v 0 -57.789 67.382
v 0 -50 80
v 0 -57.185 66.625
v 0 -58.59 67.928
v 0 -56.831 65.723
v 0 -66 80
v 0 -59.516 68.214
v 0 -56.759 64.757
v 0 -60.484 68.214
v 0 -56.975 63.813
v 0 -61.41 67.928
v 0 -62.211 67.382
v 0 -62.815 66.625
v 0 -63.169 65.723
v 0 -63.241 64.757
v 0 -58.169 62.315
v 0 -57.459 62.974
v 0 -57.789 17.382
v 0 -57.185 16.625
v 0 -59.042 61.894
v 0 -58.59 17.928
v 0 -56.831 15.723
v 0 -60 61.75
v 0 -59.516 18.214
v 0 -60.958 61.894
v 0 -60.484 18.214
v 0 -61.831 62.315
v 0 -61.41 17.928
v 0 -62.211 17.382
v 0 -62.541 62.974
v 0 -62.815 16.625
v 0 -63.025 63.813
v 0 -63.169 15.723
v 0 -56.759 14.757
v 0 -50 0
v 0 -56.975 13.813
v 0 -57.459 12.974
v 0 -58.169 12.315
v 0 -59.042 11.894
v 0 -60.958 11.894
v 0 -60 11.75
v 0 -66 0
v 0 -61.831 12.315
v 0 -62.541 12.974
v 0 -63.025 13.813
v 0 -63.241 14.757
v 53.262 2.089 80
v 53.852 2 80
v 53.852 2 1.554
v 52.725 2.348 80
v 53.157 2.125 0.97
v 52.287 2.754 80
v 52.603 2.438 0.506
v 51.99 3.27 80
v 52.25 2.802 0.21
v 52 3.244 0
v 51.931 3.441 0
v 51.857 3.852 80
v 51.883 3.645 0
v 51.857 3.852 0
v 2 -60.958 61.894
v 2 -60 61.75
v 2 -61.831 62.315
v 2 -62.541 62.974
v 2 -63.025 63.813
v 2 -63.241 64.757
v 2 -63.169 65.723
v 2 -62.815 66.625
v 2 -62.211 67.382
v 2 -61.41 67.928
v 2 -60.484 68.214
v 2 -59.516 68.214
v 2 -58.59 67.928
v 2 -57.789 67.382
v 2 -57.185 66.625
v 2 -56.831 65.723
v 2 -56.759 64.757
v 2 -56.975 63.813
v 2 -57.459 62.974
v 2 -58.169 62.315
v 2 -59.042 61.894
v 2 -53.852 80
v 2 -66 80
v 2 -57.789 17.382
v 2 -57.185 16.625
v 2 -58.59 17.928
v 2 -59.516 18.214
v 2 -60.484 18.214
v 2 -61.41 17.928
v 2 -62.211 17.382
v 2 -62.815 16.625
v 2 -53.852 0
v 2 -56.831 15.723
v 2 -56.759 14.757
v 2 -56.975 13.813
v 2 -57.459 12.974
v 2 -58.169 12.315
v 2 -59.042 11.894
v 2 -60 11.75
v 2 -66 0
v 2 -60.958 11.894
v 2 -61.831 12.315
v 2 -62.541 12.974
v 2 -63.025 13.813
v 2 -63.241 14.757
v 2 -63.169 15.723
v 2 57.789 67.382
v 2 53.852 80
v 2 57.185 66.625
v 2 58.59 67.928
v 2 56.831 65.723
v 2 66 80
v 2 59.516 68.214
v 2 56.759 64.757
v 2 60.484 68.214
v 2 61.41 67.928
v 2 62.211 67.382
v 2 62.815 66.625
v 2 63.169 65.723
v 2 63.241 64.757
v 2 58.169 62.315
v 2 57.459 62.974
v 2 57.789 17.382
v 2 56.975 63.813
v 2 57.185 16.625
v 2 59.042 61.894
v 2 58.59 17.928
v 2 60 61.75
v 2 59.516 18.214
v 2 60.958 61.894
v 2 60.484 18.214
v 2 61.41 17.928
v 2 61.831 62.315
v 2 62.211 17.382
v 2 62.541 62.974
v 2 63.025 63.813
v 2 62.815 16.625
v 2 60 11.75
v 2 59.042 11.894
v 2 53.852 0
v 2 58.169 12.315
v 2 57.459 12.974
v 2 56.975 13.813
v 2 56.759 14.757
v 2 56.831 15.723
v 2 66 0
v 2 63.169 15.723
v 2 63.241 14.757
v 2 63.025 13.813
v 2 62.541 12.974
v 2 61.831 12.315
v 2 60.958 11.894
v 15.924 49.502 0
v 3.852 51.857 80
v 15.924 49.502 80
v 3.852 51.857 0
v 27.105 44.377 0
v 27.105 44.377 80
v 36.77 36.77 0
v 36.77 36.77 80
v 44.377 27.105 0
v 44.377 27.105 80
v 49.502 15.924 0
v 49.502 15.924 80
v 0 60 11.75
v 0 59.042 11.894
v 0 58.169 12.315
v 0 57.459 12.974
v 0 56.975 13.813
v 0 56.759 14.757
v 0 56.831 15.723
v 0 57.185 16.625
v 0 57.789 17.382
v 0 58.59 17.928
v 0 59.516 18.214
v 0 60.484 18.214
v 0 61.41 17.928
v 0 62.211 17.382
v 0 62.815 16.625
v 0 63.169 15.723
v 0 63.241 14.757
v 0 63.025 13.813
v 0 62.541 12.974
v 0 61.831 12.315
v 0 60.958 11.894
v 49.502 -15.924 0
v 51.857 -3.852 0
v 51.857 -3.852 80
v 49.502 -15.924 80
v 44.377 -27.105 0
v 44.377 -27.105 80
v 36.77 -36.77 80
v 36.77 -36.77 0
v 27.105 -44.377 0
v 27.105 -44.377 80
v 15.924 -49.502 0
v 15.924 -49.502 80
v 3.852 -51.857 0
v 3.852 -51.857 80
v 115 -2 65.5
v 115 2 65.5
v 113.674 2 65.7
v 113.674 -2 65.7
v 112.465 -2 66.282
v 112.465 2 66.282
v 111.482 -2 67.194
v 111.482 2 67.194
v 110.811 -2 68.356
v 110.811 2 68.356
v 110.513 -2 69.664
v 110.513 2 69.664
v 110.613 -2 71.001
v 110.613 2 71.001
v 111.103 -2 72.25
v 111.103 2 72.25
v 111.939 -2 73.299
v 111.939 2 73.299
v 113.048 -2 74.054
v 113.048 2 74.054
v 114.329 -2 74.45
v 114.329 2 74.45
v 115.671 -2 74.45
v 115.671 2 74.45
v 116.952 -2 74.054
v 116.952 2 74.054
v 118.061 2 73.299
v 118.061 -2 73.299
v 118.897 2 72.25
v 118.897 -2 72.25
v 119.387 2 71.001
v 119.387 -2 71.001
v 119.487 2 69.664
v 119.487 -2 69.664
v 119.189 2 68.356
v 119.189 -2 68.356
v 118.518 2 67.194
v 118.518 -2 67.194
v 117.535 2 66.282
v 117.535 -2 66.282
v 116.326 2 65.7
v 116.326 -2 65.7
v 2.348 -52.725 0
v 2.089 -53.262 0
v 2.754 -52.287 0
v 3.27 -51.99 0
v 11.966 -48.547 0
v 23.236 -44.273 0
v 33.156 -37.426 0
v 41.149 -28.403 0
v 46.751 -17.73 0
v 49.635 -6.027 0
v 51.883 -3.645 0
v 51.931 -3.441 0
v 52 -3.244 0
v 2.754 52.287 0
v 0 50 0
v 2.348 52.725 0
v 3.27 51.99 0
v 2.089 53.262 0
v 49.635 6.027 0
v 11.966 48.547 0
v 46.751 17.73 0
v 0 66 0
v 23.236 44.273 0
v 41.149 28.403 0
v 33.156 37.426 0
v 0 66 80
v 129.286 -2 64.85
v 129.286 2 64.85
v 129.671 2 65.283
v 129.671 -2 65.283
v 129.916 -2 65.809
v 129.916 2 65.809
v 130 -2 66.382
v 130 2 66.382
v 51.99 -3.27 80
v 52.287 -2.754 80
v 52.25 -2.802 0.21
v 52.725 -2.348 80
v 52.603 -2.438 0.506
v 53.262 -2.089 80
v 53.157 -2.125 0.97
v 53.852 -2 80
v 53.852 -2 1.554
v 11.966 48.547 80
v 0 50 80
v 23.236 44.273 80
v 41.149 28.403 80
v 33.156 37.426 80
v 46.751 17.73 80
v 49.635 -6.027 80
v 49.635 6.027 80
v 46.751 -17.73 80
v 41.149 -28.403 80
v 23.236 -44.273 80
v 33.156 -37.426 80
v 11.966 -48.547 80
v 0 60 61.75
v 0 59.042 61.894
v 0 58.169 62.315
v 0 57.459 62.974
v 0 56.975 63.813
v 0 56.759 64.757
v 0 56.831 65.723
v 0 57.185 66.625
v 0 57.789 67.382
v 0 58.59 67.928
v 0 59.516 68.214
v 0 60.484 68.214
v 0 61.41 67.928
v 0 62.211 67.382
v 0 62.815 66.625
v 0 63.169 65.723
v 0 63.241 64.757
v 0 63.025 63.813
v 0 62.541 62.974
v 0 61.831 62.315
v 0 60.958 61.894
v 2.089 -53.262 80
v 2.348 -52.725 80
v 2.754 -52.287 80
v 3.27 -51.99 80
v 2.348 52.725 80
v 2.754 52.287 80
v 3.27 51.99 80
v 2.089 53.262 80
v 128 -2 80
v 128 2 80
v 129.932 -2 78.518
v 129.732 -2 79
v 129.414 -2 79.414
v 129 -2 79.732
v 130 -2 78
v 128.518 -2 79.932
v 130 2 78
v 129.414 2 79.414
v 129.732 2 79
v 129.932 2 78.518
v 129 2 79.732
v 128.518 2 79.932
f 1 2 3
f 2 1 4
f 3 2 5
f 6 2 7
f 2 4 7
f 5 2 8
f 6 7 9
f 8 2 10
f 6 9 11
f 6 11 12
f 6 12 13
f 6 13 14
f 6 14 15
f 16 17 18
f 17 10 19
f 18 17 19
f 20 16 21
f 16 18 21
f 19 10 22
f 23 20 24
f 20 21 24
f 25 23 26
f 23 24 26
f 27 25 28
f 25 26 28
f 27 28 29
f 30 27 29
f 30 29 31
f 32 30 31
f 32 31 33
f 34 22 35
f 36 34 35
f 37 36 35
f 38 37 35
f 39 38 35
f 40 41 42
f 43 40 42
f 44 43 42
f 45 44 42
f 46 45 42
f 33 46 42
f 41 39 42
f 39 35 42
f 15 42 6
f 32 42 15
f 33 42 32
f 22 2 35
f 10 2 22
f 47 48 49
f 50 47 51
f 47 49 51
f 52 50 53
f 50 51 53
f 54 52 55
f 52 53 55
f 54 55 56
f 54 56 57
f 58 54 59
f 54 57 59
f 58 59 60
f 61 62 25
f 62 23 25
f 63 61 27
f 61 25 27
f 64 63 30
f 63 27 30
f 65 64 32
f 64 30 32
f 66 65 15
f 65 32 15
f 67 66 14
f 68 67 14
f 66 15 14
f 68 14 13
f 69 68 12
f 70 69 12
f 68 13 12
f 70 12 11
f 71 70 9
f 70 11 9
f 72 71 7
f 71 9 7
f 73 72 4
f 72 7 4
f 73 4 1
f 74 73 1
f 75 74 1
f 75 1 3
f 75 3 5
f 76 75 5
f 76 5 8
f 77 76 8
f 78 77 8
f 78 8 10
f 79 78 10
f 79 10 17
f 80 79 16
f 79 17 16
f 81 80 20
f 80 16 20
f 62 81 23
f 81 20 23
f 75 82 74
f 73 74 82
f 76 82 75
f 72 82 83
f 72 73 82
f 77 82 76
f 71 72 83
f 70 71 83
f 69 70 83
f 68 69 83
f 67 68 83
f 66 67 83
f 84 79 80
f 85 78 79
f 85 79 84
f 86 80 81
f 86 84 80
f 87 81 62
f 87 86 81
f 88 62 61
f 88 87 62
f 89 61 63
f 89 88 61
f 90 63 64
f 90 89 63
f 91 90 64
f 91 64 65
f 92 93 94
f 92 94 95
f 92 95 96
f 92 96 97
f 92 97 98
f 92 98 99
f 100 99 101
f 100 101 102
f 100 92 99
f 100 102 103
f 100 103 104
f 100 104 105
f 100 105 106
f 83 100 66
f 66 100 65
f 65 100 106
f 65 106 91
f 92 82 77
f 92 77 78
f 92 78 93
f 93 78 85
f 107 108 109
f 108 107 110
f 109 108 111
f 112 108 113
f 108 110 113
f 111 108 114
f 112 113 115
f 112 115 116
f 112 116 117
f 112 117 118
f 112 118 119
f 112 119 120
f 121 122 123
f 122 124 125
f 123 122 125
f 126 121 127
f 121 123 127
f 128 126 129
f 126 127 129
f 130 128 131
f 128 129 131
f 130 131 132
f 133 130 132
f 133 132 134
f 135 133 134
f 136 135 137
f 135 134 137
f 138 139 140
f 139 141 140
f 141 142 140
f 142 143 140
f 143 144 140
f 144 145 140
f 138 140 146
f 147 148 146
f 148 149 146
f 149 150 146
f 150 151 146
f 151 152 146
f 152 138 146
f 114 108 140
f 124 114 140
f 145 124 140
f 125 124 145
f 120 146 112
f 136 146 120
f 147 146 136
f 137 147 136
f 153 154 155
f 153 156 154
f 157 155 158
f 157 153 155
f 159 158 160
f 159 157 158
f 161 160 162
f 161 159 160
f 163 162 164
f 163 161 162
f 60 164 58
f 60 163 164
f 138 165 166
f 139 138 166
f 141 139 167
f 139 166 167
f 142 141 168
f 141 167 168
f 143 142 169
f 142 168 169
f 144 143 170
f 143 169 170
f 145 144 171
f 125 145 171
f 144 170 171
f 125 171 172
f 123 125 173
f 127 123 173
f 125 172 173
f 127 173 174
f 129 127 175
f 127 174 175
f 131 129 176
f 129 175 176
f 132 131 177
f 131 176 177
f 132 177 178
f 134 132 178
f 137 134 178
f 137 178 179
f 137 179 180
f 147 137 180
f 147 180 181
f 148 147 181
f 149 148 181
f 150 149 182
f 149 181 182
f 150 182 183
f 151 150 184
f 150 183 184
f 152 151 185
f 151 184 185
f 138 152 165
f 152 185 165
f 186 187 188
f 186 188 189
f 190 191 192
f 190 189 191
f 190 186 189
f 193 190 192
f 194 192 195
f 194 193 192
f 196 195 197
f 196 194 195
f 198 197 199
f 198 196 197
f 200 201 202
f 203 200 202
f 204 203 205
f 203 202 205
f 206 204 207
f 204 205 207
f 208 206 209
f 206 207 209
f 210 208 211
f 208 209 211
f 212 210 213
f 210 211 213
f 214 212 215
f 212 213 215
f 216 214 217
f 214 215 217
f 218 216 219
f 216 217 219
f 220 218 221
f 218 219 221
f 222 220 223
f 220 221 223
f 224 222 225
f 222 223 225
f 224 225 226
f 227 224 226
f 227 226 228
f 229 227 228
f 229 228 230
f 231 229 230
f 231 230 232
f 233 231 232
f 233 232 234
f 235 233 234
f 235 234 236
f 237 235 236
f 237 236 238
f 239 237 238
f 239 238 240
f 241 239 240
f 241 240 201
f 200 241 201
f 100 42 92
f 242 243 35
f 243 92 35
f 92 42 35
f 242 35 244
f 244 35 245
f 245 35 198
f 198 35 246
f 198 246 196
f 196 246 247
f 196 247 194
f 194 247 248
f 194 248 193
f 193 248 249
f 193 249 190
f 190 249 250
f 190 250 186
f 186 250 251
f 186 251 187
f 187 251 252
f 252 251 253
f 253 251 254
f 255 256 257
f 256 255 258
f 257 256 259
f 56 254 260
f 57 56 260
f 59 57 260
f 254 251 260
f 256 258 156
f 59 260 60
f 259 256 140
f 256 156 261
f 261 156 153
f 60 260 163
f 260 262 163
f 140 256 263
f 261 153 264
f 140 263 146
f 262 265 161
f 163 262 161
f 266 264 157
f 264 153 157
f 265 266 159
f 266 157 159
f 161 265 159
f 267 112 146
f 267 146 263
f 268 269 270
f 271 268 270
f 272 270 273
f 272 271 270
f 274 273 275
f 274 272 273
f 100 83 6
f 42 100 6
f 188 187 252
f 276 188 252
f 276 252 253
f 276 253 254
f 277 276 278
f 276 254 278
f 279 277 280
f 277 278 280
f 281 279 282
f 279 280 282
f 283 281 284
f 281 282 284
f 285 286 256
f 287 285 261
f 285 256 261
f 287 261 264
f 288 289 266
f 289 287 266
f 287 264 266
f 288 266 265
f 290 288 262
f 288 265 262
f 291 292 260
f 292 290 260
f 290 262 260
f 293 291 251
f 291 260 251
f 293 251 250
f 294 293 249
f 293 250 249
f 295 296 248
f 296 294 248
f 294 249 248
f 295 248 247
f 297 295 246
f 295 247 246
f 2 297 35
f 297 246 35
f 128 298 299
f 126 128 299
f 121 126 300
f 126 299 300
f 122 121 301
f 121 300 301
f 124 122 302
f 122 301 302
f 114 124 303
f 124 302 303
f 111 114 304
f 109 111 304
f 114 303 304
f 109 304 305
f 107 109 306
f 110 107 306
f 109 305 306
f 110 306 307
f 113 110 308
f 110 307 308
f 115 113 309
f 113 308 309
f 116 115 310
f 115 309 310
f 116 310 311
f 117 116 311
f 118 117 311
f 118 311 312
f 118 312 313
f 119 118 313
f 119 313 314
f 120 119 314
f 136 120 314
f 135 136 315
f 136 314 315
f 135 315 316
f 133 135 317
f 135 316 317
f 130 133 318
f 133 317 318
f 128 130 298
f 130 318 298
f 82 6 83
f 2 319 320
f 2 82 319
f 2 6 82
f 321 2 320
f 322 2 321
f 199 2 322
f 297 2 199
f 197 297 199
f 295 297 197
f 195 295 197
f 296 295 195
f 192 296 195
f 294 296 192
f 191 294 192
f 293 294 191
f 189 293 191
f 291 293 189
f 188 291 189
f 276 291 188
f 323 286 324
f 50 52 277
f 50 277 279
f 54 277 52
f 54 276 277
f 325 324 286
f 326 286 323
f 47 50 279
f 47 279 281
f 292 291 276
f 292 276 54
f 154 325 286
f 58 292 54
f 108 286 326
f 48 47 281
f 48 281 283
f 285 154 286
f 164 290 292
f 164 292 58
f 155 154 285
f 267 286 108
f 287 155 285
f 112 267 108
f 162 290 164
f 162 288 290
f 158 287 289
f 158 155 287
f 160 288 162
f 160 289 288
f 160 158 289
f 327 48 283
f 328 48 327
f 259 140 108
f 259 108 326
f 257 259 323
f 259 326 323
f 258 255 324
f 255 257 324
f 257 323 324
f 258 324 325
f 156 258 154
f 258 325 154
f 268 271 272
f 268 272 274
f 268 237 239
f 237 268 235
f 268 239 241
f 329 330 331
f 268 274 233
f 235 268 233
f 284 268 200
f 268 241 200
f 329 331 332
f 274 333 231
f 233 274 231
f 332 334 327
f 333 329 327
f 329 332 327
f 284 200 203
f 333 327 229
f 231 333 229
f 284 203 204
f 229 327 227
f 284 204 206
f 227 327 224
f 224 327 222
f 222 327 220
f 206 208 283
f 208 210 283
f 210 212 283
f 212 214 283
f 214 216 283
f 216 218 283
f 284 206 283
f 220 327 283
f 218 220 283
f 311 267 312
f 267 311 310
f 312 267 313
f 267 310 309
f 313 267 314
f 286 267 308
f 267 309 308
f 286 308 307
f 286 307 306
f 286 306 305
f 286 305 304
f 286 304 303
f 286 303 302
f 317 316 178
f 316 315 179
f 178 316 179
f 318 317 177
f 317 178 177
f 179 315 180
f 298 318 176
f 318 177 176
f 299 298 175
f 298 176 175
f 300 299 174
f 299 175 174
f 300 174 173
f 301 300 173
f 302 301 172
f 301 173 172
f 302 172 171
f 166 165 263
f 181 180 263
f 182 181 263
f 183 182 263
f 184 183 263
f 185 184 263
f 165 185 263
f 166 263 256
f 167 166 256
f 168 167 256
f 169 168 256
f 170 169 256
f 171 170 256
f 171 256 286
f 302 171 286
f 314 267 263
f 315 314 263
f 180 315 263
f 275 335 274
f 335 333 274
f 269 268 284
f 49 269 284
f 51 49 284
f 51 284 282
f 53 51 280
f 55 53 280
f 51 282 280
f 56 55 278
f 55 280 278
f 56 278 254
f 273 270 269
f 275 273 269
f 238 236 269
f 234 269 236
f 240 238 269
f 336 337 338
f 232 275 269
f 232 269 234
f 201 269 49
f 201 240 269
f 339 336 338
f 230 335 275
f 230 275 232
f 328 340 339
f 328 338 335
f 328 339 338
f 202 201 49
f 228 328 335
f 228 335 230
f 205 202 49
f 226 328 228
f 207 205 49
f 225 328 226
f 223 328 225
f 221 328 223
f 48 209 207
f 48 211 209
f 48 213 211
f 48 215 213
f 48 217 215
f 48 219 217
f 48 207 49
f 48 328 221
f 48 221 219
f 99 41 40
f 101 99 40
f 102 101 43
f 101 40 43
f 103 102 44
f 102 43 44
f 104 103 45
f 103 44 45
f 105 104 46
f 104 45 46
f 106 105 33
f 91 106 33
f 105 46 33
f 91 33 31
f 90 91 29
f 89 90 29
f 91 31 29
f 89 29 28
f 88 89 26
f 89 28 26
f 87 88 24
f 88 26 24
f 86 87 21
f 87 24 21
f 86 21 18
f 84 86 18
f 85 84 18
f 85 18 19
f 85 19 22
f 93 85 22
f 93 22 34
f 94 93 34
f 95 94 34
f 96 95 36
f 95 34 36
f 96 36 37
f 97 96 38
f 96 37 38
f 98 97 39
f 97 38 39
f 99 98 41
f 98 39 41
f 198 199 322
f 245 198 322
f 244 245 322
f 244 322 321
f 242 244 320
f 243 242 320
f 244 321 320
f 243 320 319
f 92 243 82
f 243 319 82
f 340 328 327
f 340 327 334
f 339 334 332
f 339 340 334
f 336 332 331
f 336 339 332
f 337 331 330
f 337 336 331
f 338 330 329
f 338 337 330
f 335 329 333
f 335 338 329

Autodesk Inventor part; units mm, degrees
ref_plane "YZ Plane" through (0, 0, 0) normal (1, 0, 0) x (0, 1, 0)
ref_plane "XZ Plane" through (0, 0, 0) normal (0, 1, 0) x (-1, 0, 0)
ref_plane "XY Plane" through (0, 0, 0) normal (0, 0, 1) x (1, 0, 0)
sketch "Sketch2" plane through (0, 0, 0) normal (0, 0, 1) x (1, 0, 0)
  arc A0 (0, -52) -> (0, 52) centre (0, 0) ccw
  arc A1 (0, -50) -> (0, 50) centre (0, 0) ccw
  line L0 (0, 52) -> (0, 50)
  line L1 (0, -50) -> (0, -52)
  line L2 (0, -50) -> (2, -50)
  line L3 (2, -50) -> (2, -66)
  line L4 (2, -66) -> (0, -66)
  line L5 (0, -66) -> (0, -50)
  line L6 (0, 50) -> (2, 50)
  line L7 (2, 50) -> (2, 66)
  line L8 (2, 66) -> (0, 66)
  line L9 (0, 66) -> (0, 50)
  point P0 (0, 52)
  point P1 (2, 51.9615)
  point P2 (2, -51.9615)
  dimension "d0" = 104
  dimension "d1" = 100
  dimension "d2" = 2
  dimension "d5" = 2
  dimension "d6" = 16
  dimension "d7" = 2
  dimension "d8" = 16
extrude "Extrusion1" add sketch "Sketch2" along normal blind 80
fillet "Fillet1" radius 2 2 edges at (2, -51.9615, 40) (2, 51.9615, 40)
sketch "Sketch3" plane through (2, -66, 80) normal (1, 0, 0) x (0, 0, -1)
  line L0 (80, 16) -> (80, 0) construction
  line L1 (80, 0) -> (0, 0) construction
  line L2 (0, 16) -> (0, 0) construction
  line L3 (80, 16) -> (0, 16) construction
  line L4 (80, 132) -> (80, 116) construction
  line L5 (80, 116) -> (0, 116) construction
  line L6 (0, 132) -> (0, 116) construction
  line L7 (80, 132) -> (0, 132) construction
  point P0 (80, 66)
  point P1 (15, 6)
  point P2 (65, 6)
  point P3 (15, 126)
  point P4 (65, 126)
  dimension "d10" = 15
  dimension "d11" = 15
  dimension "d12" = 15
  dimension "d13" = 15
  dimension "d14" = 6
  dimension "d15" = 6
  dimension "d16" = 6
  dimension "d17" = 6
hole "Hole1" at (2, -60, 65) at (2, -60, 15) at (2, 60, 65) at (2, 60, 15) direction (-1, 0, 0) diameter 6.5 depth 2
sketch "Sketch4" plane through (0, 0, 0) normal (0, 1, 0) x (-1, 0, 0)
  line L0 (-3.8519, 80) -> (-3.8519, 0) construction
  line L1 (-3.8519, 80) -> (-3.8519, 80) construction
  line L2 (-3.8519, 0) -> (-3.8519, 80) construction
  line L3 (-3.8519, 0) -> (-3.8519, 0) construction
  line L4 (-52, 0) -> (-52, 80) construction
  line L5 (-50, 80) -> (-130, 80)
  line L6 (-130, 80) -> (-130, 65.4498)
  line L7 (-130, 65.4498) -> (-52, 0)
  line L8 (-52, 0) -> (-49.7983, 0)
  line L9 (-50, 80) -> (-50, 0) construction
  line L10 (-52, 0) -> (-50, 0)
  line L11 (-50, 0) -> (-50, 80)
  line L12 (-50, 80) -> (-50, 80)
  point P0 (0, 0)
  dimension "d25" = 80
  dimension "d26" = 130
extrude "Extrusion2" add sketch "Sketch4" along normal mid plane 4
sketch "Sketch5" plane through (0, -2, 0) normal (0, -1, 0) x (1, 0, 0)
  line L0 (130, 80) -> (51.9615, 80) construction
  line L1 (130, 65.4498) -> (130, 80) construction
  point P0 (0, 0)
  point P1 (115, 70)
  point P2 (52, 80)
  dimension "d29" = 10
  dimension "d30" = 15
hole "Hole2" at (115, -2, 70) direction (0, 1, 0) diameter 9 depth 4
fillet "Fillet2" radius 2 2 edges at (130, 0, 80) (130, 0, 65.4498)
fillet "Fillet3" radius 2 2 edges at (51.9615, -2, 40) (51.9615, 2, 40)
properties part number "P049_SupportTube"
